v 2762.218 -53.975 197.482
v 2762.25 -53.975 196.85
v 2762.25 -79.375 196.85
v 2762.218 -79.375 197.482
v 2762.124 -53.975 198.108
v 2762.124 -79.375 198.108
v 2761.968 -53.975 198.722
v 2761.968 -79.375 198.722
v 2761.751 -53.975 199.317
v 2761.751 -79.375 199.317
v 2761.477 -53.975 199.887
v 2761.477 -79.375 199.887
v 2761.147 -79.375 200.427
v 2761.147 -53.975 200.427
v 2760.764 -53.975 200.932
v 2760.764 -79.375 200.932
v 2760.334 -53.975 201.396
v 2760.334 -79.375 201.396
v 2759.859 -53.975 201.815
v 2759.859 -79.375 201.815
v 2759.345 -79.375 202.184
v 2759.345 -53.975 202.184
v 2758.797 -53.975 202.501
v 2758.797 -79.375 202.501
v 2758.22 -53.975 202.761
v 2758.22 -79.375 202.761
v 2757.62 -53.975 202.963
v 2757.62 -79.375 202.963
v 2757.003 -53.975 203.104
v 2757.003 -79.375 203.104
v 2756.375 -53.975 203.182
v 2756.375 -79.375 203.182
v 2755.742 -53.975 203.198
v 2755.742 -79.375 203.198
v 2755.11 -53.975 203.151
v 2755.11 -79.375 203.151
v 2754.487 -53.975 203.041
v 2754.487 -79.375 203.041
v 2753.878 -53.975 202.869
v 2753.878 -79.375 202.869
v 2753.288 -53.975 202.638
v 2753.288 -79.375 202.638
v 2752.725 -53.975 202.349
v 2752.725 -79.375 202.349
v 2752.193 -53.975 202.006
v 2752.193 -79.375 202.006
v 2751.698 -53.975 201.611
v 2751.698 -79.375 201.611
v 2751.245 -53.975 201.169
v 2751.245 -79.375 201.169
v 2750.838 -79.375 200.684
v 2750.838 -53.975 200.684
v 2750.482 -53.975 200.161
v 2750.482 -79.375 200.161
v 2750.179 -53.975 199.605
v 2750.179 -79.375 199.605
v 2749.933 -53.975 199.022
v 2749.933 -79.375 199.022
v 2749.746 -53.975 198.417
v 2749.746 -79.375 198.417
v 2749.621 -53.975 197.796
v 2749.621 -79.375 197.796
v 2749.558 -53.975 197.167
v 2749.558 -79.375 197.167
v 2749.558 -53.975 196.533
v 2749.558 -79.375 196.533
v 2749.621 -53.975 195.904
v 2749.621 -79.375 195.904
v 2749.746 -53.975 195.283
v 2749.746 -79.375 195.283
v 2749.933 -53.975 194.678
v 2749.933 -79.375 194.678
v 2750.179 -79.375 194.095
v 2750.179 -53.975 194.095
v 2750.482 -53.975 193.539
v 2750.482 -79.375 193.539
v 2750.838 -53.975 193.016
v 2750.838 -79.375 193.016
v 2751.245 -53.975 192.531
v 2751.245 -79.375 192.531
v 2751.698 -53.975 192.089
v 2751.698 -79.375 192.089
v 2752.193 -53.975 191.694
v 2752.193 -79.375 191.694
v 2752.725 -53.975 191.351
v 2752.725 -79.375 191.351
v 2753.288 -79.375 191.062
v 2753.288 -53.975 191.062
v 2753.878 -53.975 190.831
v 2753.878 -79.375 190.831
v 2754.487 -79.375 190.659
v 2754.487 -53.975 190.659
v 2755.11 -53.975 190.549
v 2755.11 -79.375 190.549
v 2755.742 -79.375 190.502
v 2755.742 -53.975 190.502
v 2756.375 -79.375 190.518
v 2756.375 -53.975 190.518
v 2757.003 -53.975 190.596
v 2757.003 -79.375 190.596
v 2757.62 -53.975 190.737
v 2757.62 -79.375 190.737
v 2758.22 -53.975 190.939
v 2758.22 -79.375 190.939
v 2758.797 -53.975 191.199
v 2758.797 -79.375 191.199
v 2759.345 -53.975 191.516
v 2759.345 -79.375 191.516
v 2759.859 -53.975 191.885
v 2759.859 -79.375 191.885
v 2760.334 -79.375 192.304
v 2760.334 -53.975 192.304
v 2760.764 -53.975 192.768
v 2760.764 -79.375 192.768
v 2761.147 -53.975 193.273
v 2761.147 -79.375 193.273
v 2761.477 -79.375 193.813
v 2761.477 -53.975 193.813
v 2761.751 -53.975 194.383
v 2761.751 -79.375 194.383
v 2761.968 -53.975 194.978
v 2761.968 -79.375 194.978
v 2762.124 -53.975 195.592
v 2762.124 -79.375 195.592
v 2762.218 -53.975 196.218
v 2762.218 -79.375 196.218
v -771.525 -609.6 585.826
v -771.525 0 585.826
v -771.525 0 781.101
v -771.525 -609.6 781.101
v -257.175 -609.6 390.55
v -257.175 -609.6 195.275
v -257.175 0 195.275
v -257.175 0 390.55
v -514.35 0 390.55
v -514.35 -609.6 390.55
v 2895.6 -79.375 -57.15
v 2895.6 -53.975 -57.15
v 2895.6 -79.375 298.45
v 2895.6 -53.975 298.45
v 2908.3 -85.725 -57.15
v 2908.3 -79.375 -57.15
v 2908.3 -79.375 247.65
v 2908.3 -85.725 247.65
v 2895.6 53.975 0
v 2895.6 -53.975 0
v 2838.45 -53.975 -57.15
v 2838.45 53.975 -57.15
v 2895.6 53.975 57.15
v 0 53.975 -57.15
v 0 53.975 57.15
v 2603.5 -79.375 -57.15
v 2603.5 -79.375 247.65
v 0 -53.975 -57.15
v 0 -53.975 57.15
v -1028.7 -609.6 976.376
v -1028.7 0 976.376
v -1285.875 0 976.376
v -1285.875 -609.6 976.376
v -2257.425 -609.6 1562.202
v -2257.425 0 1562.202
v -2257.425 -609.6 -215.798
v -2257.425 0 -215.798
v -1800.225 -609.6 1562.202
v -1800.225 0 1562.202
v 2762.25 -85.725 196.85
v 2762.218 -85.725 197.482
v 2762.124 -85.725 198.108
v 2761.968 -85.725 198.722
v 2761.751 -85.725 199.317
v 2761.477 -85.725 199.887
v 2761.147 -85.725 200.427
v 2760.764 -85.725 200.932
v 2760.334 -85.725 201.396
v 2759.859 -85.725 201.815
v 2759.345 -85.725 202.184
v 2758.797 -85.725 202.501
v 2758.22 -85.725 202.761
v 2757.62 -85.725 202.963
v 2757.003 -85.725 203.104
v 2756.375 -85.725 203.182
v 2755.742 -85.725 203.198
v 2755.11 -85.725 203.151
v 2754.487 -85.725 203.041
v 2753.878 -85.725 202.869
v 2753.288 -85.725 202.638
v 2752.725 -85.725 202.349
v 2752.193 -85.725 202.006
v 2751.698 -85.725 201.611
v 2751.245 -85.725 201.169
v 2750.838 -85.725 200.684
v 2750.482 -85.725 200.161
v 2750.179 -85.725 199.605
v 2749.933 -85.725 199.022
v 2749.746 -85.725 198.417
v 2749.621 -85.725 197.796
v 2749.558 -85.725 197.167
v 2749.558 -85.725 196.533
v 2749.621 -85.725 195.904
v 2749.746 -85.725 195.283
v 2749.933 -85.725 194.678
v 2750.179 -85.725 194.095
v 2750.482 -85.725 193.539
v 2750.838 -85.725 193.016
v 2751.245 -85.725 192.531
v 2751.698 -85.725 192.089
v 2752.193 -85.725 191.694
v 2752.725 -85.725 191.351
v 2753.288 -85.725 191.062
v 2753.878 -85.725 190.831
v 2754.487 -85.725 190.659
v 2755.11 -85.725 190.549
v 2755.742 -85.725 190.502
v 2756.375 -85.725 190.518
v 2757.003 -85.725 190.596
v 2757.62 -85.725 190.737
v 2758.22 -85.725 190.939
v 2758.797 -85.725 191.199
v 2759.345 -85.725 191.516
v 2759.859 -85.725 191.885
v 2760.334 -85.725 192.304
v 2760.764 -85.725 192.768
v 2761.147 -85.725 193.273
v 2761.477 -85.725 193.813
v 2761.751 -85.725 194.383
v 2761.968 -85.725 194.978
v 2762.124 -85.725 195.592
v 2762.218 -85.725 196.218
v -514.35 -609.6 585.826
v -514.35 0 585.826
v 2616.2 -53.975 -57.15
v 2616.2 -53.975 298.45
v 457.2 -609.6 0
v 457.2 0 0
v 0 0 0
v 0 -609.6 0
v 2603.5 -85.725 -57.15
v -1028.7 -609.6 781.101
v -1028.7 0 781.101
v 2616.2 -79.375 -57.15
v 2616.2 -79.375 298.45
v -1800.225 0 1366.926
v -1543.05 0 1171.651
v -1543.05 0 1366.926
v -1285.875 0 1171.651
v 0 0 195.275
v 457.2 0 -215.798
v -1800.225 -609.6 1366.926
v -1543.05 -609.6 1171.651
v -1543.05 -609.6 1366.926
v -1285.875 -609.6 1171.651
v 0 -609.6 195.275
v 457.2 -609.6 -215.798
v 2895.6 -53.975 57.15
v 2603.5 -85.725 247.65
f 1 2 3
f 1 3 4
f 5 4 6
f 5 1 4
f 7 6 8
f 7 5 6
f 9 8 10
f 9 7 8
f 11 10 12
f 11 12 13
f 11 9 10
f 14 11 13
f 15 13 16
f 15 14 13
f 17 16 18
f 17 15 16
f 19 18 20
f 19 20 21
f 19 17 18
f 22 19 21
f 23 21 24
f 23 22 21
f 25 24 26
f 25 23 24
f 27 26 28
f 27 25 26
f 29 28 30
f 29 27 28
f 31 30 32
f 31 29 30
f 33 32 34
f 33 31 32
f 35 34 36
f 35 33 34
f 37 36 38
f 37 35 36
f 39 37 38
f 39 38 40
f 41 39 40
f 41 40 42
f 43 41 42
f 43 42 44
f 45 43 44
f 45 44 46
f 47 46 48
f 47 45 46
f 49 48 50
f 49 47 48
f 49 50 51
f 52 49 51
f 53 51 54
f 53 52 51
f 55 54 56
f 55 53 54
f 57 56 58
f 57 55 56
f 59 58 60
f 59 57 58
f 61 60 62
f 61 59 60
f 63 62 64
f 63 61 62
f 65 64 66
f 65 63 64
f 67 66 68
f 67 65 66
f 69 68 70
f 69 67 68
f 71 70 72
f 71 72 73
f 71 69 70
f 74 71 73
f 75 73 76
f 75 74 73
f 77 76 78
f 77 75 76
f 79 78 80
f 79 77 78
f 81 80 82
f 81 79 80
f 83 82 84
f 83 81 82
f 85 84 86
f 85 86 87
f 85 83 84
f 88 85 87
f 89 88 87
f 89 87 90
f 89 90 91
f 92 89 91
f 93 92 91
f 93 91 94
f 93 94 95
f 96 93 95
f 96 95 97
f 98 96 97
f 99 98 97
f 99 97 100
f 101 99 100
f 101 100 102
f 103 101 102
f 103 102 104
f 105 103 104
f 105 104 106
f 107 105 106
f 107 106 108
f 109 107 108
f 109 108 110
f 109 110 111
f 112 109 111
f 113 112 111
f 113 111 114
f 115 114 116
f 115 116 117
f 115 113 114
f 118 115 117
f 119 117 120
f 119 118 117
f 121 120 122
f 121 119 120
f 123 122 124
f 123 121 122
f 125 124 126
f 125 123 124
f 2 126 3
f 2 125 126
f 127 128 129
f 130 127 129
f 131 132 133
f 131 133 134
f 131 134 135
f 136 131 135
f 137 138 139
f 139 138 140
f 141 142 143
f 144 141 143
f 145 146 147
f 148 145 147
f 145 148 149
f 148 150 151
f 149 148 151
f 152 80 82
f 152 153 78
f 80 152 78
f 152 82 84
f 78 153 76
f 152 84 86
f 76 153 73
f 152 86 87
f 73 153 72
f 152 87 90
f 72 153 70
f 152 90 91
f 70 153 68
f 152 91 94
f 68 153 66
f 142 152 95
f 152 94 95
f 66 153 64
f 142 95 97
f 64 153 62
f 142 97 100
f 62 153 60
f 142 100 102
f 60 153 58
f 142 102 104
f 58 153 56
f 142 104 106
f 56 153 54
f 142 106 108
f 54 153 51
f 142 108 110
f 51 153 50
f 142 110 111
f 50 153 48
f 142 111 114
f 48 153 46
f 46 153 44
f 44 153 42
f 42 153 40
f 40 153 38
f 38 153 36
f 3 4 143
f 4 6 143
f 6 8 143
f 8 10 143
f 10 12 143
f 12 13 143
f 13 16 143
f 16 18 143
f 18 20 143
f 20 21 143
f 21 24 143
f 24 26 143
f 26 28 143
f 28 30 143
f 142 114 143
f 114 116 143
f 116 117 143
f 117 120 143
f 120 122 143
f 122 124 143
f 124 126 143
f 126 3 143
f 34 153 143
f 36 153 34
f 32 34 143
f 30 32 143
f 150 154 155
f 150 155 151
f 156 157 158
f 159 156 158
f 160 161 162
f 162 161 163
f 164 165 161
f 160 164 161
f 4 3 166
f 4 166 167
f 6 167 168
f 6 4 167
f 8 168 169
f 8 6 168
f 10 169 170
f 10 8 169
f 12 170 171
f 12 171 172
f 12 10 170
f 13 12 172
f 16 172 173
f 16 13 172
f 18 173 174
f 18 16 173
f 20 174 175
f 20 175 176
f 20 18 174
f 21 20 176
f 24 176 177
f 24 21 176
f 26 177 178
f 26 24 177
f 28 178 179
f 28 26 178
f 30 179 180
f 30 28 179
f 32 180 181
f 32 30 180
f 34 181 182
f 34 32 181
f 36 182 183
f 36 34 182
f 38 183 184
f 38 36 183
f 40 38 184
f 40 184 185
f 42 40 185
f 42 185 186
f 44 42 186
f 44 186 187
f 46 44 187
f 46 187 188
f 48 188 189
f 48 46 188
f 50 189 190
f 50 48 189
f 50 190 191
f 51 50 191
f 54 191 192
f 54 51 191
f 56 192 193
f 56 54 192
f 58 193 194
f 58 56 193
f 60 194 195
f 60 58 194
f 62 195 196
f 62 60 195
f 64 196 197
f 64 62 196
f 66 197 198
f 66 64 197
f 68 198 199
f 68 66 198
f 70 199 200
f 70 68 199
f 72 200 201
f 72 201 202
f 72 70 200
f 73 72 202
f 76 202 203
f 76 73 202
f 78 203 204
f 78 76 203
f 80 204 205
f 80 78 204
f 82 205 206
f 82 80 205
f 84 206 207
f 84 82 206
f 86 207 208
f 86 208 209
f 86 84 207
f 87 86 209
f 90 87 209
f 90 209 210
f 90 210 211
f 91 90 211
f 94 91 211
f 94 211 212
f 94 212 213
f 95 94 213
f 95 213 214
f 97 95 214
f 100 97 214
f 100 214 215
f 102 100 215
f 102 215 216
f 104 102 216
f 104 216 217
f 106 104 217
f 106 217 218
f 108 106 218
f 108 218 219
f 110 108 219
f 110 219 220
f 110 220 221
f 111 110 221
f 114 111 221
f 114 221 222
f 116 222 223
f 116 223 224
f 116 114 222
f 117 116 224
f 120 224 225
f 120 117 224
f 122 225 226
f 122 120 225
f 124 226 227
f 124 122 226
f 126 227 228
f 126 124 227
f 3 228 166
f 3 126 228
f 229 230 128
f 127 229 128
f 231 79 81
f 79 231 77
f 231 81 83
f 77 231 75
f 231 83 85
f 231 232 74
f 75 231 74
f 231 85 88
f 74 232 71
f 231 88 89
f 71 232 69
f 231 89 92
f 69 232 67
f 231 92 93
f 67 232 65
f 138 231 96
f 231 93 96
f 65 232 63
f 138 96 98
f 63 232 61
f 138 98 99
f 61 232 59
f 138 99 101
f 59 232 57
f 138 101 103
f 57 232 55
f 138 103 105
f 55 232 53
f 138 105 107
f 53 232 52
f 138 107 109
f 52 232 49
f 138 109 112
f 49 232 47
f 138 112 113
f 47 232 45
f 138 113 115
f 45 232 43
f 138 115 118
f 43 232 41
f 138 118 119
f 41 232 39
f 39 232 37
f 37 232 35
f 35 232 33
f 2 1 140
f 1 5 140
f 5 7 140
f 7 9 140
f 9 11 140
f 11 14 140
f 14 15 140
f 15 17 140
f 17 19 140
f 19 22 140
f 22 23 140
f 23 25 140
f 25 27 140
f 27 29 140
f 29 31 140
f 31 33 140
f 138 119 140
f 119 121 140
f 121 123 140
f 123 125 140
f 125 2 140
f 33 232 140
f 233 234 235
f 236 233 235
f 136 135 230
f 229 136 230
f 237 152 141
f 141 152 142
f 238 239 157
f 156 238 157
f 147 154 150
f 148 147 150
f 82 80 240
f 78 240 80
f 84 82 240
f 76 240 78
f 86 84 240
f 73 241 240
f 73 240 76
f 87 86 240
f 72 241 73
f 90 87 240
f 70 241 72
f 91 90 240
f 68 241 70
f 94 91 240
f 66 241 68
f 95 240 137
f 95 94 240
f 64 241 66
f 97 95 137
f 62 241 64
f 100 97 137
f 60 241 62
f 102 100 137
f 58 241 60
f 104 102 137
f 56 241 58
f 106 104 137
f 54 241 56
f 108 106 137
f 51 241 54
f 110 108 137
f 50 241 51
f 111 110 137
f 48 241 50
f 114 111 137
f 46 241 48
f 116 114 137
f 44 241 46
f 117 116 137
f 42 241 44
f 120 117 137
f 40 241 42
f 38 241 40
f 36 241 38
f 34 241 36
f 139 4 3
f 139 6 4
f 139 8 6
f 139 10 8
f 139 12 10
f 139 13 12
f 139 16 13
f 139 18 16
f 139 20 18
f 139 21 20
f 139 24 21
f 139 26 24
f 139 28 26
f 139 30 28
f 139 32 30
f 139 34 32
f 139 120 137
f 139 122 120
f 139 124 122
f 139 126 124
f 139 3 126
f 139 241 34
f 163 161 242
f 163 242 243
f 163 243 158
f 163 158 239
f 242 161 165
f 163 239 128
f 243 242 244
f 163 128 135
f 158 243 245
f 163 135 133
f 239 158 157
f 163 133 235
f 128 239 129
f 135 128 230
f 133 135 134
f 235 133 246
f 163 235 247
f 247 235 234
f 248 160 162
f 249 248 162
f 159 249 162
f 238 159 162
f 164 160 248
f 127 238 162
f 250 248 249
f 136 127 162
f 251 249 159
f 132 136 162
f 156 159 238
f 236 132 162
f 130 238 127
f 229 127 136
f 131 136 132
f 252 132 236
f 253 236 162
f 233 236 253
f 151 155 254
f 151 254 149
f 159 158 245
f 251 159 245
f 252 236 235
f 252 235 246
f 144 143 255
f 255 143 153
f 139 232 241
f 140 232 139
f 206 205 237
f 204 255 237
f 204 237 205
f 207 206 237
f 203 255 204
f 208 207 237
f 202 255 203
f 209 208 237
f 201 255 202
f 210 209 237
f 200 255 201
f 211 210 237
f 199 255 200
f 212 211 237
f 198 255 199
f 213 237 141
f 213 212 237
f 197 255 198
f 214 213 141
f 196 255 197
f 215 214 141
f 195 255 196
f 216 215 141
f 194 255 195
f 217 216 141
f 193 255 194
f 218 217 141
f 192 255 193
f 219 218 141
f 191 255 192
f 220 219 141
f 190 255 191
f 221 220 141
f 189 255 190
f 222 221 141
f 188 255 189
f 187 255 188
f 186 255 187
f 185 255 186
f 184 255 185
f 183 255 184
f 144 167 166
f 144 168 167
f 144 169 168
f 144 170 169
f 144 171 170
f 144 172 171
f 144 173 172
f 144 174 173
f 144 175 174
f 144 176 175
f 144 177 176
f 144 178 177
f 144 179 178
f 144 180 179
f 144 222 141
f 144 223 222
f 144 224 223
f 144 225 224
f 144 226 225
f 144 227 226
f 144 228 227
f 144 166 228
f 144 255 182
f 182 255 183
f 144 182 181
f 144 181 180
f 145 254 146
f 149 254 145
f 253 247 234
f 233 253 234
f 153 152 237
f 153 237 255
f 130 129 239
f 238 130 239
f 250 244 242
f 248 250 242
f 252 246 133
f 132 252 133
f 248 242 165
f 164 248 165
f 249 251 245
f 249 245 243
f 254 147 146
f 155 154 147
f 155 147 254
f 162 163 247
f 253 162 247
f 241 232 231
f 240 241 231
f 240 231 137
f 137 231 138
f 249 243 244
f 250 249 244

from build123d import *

# Parameters (mm, degrees)
F1_DEPTH = 609.6
F2_W     = 107.95
F2_H     = 114.3
F3_DEPTH = 2895.6
F5_DEPTH = 107.95
F6_W     = 279.4
F6_H     = 241.3
F6_R     = 6.35
F7_DEPTH = 25.4
F8_W     = 12.7
F8_H     = 304.8
F8_W_2   = 279.4
F8_R     = 6.35
F9_DEPTH = 6.35


with BuildPart() as f1:
    # F0 (on Front) → F1 (new body)
    with BuildSketch(Plane.XZ):
        Polygon((457.2, 0), (0, 0), (0, 195.2752), (-257.175, 195.2752), (-257.175, 390.5504), (-514.35, 390.5504), (-514.35, 585.8256), (-771.525, 585.8256), (-771.525, 781.1008), (-1028.7, 781.1008), (-1028.7, 976.376), (-1285.875, 976.376), (-1285.875, 1171.6512), (-1543.05, 1171.6512), (-1543.05, 1366.9264), (-1800.225, 1366.9264), (-1800.225, 1562.2016), (-2257.425, 1562.2016), (-2257.425, -215.7984), (457.2, -215.7984), align=None)
    extrude(amount=F1_DEPTH)


with BuildPart() as f3:
    # F2 (on Right) → F3 (new body)
    with BuildSketch(Plane.YZ):
        Rectangle(F2_W, F2_H)
    extrude(amount=F3_DEPTH)

    # F4 (on face) → F5 (cut, through all)
    with BuildSketch(Plane.XZ.offset(53.975)):
        Polygon((2838.45, -57.15), (2895.6, -57.15), (2895.6, 0), align=None)
    extrude(amount=-F5_DEPTH, mode=Mode.SUBTRACT)


with BuildPart() as f7:
    # F6 (on face) → F7 (new body)
    with BuildSketch(Plane.XZ.offset(53.975)):
        with Locations((2755.9, 177.8)):
            Rectangle(F6_W, F6_H)
        with Locations((2755.9, 196.85)):
            Circle(F6_R, mode=Mode.SUBTRACT)
        Polygon((2895.6, 0), (2838.45, -57.15), (2895.6, -57.15), align=None)
        Polygon((2616.2, -57.15), (2838.45, -57.15), (2895.6, 0), (2895.6, 57.15), (2616.2, 57.15), align=None)
    extrude(amount=F7_DEPTH)


with BuildPart() as f9:
    # F8 (on face) → F9 (new body)
    with BuildSketch(Plane.XZ.offset(79.375)):
        with Locations((2609.85, 95.25)):
            Rectangle(F8_W, F8_H)
        with Locations((2901.95, 95.25)):
            Rectangle(F8_W, F8_H)
        with Locations((2755.9, 95.25)):
            Rectangle(F8_W_2, F8_H)
        with Locations((2755.9, 196.85)):
            Circle(F8_R, mode=Mode.SUBTRACT)
    extrude(amount=F9_DEPTH)


solid = Compound([f1.part, f3.part, f7.part, f9.part])
